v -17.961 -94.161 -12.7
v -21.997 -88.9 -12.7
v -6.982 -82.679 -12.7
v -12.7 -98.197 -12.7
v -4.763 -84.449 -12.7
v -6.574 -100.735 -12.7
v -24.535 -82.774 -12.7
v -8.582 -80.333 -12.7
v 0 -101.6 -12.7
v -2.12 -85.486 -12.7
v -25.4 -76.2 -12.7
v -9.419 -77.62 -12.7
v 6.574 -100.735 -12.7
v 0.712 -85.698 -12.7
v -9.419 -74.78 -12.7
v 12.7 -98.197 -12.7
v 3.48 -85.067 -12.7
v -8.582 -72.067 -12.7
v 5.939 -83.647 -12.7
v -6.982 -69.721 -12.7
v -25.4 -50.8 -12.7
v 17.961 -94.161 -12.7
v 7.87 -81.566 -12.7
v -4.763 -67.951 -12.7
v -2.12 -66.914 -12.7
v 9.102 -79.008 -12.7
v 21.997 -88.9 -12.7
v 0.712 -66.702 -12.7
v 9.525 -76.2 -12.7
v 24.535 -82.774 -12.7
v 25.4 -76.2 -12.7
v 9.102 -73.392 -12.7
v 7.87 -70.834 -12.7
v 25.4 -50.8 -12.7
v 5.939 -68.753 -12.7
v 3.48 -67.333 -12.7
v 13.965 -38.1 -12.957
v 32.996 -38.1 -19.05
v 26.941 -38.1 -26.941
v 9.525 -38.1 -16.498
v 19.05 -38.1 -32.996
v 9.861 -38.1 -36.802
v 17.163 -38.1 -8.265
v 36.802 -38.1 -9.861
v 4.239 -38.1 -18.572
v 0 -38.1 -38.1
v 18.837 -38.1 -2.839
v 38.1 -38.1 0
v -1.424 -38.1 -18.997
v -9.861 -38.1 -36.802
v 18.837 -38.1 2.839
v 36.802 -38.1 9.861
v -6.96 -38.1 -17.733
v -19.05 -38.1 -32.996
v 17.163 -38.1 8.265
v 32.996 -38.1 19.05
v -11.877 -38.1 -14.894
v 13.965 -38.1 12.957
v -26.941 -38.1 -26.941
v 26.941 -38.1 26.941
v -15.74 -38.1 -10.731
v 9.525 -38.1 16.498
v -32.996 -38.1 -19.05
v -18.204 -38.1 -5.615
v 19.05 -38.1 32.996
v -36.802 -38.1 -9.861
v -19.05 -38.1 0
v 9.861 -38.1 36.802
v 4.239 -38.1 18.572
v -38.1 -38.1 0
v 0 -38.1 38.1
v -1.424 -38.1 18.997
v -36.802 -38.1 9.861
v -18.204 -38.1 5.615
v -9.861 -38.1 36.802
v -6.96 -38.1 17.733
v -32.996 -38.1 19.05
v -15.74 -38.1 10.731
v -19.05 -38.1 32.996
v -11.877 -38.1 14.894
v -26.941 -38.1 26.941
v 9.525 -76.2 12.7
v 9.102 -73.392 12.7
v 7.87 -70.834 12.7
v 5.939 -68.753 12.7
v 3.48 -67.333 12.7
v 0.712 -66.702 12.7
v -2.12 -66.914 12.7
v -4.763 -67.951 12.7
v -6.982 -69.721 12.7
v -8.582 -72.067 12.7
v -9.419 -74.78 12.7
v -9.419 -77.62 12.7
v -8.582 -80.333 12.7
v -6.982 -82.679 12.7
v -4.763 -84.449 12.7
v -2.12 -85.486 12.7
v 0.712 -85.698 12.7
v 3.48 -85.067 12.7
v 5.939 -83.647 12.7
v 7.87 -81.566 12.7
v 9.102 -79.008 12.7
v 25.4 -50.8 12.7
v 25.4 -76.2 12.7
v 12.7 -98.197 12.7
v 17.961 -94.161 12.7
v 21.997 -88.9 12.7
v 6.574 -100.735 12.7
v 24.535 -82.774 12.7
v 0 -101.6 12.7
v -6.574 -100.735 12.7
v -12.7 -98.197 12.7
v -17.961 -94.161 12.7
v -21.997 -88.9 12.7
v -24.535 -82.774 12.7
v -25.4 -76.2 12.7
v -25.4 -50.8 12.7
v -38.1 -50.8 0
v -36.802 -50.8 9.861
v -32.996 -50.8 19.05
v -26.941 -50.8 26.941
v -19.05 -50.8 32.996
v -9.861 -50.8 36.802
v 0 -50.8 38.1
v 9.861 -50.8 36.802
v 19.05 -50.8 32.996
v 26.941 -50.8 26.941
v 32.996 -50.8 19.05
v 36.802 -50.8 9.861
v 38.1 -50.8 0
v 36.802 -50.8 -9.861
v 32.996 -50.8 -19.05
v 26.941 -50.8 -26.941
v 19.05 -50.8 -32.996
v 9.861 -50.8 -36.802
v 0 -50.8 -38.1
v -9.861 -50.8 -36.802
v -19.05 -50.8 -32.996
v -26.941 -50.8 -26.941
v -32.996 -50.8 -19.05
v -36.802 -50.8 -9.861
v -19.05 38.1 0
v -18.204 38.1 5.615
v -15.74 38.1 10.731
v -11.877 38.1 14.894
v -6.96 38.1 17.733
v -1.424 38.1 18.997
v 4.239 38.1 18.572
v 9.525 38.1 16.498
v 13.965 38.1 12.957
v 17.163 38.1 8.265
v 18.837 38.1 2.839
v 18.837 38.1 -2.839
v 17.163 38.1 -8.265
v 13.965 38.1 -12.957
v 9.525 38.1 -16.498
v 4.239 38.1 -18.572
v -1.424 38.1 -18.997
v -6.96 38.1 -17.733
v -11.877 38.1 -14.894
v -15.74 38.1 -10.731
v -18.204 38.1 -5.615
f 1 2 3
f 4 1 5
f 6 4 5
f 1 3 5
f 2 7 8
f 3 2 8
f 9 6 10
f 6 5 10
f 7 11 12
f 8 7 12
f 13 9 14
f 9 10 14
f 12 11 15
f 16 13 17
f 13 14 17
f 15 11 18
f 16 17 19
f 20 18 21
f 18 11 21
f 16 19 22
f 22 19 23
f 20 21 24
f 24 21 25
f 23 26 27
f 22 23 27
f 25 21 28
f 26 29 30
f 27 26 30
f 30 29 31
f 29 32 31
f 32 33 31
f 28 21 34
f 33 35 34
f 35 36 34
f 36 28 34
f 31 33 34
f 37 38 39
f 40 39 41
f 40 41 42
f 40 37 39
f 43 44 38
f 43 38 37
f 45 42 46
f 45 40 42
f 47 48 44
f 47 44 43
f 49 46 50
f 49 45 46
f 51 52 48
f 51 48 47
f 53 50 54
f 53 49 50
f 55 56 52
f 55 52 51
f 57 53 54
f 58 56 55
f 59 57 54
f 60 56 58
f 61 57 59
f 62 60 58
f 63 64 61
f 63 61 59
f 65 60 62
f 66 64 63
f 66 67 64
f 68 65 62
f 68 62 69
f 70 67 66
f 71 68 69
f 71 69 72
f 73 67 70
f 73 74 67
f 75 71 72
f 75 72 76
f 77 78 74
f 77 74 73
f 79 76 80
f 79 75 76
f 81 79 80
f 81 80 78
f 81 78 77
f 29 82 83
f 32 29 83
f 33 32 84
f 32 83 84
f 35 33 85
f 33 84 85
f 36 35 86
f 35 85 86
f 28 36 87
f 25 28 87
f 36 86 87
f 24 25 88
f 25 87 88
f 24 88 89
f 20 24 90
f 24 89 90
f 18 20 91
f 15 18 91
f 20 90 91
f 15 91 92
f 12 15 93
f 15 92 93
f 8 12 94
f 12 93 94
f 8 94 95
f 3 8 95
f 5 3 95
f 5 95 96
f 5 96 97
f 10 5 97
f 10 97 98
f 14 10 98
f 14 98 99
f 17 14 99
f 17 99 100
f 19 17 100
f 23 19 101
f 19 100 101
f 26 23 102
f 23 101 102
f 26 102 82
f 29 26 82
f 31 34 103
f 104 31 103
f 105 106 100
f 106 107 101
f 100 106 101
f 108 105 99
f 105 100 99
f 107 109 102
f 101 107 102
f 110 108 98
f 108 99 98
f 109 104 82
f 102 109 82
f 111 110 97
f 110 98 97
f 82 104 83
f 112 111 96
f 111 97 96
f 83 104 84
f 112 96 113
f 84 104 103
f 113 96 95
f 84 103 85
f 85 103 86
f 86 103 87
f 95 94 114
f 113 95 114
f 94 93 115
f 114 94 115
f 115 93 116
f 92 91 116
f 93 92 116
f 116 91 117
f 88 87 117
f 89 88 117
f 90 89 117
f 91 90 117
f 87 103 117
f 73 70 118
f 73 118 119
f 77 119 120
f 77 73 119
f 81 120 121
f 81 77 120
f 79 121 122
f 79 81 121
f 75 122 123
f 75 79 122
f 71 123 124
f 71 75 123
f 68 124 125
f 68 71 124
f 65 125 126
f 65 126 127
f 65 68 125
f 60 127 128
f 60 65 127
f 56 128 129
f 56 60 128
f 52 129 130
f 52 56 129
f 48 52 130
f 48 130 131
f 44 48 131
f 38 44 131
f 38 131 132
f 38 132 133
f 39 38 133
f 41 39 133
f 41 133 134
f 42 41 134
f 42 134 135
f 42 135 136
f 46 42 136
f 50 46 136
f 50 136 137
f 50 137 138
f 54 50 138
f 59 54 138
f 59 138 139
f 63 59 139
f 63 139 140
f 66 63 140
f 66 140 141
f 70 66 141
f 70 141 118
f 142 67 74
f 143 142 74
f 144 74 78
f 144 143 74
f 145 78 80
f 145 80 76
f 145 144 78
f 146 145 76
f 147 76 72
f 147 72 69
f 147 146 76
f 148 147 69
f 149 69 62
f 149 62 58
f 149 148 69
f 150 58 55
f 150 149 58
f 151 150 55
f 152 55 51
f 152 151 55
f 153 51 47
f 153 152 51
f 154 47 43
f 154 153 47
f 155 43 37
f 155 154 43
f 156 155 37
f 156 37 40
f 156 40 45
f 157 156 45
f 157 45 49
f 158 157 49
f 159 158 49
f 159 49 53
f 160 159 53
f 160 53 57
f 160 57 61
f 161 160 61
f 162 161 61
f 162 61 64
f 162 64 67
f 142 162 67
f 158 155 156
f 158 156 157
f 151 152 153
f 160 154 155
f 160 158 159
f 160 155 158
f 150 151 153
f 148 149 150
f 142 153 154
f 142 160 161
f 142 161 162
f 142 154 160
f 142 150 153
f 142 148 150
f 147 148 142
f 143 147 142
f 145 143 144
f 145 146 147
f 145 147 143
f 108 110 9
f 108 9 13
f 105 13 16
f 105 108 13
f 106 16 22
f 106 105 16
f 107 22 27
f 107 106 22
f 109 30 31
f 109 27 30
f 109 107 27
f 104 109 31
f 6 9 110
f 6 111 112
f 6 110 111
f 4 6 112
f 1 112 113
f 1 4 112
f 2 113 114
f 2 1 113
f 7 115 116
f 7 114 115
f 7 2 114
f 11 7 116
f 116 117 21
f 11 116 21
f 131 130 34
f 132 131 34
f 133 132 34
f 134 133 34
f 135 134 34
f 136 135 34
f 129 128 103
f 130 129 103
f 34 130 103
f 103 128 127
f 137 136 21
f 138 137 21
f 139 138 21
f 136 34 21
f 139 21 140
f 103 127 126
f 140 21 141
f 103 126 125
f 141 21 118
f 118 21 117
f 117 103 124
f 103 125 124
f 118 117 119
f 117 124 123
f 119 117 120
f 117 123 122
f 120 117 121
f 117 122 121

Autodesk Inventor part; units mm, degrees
ref_plane "YZ Plane" through (0, 0, 0) normal (1, 0, 0) x (0, 1, 0)
ref_plane "XZ Plane" through (0, 0, 0) normal (0, 1, 0) x (-1, 0, 0)
ref_plane "XY Plane" through (0, 0, 0) normal (0, 0, 1) x (1, 0, 0)
sketch "Sketch1" plane through (0, 0, 0) normal (0, 0, 1) x (1, 0, 0)
  line L0 (-19.05, 38.1) -> (0, 38.1)
  line L1 (-19.05, -38.1) -> (-19.05, 38.1)
  line L2 (-38.1, -50.8) -> (-38.1, -38.1)
  line L3 (-19.05, -38.1) -> (-38.1, -38.1)
  line L4 (-38.1, -50.8) -> (0, -50.8)
  line L5 (0, 38.1) -> (0, -50.8)
  line L6 (0, -68.58) -> (0, 55.88) projected
  point P0 (0, 0)
revolve "Revolution1" add sketch "Sketch1" angle 360 about axis through (0, -10, 0) along (0, 1, 0)
sketch "Sketch2" plane through (0, -50.8, 0) normal (0, -1, 0) x (1, 0, 0)
  line L0 (25.4, 25.4) -> (-25.4, 25.4)
  line L1 (-25.4, 25.4) -> (-25.4, -25.4)
  line L2 (-25.4, -25.4) -> (25.4, -25.4)
  line L3 (25.4, -25.4) -> (25.4, 25.4)
  line L4 (25.4, 25.4) -> (-25.4, -25.4) construction
  line L5 (-25.4, 25.4) -> (25.4, -25.4) construction
  line L6 (25.4, 12.7) -> (-25.4, 12.7)
  line L7 (-25.4, 12.7) -> (-25.4, -12.7)
  line L8 (-25.4, -12.7) -> (25.4, -12.7)
  line L9 (25.4, -12.7) -> (25.4, 12.7)
  point P0 (0, 0)
  dimension "d5" = 50.8
  dimension "d6" = 50.8
extrude "Extrusion3" add sketch "Sketch2" along normal blind 50.8 contours L3 L8 L1 L6
fillet "Fillet2" radius 25.4 2 edges at (25.4, -101.6, 0) (-25.4, -101.6, 0)
sketch "Sketch4" plane through (-25.4, -50.8, 12.7) normal (0, 0, 1) x (1, 0, 0)
  arc A0 (0, -25.4) -> (50.8, -25.4) centre (25.4, -25.4) ccw projected
  line L0 (50.8, 0) -> (50.8, -25.4) projected
  line L1 (0, 0) -> (50.8, 0) projected
  line L2 (0, 0) -> (0, -25.4) projected
  circle A1 centre (25.4, -25.4) radius 9.525
  point P0 (25.4, 50.8)
  dimension "d16" = 19.05
extrude "Extrusion4" cut sketch "Sketch4" against normal blind 50.8 contours A1
properties part number "shock absorber bottom"
